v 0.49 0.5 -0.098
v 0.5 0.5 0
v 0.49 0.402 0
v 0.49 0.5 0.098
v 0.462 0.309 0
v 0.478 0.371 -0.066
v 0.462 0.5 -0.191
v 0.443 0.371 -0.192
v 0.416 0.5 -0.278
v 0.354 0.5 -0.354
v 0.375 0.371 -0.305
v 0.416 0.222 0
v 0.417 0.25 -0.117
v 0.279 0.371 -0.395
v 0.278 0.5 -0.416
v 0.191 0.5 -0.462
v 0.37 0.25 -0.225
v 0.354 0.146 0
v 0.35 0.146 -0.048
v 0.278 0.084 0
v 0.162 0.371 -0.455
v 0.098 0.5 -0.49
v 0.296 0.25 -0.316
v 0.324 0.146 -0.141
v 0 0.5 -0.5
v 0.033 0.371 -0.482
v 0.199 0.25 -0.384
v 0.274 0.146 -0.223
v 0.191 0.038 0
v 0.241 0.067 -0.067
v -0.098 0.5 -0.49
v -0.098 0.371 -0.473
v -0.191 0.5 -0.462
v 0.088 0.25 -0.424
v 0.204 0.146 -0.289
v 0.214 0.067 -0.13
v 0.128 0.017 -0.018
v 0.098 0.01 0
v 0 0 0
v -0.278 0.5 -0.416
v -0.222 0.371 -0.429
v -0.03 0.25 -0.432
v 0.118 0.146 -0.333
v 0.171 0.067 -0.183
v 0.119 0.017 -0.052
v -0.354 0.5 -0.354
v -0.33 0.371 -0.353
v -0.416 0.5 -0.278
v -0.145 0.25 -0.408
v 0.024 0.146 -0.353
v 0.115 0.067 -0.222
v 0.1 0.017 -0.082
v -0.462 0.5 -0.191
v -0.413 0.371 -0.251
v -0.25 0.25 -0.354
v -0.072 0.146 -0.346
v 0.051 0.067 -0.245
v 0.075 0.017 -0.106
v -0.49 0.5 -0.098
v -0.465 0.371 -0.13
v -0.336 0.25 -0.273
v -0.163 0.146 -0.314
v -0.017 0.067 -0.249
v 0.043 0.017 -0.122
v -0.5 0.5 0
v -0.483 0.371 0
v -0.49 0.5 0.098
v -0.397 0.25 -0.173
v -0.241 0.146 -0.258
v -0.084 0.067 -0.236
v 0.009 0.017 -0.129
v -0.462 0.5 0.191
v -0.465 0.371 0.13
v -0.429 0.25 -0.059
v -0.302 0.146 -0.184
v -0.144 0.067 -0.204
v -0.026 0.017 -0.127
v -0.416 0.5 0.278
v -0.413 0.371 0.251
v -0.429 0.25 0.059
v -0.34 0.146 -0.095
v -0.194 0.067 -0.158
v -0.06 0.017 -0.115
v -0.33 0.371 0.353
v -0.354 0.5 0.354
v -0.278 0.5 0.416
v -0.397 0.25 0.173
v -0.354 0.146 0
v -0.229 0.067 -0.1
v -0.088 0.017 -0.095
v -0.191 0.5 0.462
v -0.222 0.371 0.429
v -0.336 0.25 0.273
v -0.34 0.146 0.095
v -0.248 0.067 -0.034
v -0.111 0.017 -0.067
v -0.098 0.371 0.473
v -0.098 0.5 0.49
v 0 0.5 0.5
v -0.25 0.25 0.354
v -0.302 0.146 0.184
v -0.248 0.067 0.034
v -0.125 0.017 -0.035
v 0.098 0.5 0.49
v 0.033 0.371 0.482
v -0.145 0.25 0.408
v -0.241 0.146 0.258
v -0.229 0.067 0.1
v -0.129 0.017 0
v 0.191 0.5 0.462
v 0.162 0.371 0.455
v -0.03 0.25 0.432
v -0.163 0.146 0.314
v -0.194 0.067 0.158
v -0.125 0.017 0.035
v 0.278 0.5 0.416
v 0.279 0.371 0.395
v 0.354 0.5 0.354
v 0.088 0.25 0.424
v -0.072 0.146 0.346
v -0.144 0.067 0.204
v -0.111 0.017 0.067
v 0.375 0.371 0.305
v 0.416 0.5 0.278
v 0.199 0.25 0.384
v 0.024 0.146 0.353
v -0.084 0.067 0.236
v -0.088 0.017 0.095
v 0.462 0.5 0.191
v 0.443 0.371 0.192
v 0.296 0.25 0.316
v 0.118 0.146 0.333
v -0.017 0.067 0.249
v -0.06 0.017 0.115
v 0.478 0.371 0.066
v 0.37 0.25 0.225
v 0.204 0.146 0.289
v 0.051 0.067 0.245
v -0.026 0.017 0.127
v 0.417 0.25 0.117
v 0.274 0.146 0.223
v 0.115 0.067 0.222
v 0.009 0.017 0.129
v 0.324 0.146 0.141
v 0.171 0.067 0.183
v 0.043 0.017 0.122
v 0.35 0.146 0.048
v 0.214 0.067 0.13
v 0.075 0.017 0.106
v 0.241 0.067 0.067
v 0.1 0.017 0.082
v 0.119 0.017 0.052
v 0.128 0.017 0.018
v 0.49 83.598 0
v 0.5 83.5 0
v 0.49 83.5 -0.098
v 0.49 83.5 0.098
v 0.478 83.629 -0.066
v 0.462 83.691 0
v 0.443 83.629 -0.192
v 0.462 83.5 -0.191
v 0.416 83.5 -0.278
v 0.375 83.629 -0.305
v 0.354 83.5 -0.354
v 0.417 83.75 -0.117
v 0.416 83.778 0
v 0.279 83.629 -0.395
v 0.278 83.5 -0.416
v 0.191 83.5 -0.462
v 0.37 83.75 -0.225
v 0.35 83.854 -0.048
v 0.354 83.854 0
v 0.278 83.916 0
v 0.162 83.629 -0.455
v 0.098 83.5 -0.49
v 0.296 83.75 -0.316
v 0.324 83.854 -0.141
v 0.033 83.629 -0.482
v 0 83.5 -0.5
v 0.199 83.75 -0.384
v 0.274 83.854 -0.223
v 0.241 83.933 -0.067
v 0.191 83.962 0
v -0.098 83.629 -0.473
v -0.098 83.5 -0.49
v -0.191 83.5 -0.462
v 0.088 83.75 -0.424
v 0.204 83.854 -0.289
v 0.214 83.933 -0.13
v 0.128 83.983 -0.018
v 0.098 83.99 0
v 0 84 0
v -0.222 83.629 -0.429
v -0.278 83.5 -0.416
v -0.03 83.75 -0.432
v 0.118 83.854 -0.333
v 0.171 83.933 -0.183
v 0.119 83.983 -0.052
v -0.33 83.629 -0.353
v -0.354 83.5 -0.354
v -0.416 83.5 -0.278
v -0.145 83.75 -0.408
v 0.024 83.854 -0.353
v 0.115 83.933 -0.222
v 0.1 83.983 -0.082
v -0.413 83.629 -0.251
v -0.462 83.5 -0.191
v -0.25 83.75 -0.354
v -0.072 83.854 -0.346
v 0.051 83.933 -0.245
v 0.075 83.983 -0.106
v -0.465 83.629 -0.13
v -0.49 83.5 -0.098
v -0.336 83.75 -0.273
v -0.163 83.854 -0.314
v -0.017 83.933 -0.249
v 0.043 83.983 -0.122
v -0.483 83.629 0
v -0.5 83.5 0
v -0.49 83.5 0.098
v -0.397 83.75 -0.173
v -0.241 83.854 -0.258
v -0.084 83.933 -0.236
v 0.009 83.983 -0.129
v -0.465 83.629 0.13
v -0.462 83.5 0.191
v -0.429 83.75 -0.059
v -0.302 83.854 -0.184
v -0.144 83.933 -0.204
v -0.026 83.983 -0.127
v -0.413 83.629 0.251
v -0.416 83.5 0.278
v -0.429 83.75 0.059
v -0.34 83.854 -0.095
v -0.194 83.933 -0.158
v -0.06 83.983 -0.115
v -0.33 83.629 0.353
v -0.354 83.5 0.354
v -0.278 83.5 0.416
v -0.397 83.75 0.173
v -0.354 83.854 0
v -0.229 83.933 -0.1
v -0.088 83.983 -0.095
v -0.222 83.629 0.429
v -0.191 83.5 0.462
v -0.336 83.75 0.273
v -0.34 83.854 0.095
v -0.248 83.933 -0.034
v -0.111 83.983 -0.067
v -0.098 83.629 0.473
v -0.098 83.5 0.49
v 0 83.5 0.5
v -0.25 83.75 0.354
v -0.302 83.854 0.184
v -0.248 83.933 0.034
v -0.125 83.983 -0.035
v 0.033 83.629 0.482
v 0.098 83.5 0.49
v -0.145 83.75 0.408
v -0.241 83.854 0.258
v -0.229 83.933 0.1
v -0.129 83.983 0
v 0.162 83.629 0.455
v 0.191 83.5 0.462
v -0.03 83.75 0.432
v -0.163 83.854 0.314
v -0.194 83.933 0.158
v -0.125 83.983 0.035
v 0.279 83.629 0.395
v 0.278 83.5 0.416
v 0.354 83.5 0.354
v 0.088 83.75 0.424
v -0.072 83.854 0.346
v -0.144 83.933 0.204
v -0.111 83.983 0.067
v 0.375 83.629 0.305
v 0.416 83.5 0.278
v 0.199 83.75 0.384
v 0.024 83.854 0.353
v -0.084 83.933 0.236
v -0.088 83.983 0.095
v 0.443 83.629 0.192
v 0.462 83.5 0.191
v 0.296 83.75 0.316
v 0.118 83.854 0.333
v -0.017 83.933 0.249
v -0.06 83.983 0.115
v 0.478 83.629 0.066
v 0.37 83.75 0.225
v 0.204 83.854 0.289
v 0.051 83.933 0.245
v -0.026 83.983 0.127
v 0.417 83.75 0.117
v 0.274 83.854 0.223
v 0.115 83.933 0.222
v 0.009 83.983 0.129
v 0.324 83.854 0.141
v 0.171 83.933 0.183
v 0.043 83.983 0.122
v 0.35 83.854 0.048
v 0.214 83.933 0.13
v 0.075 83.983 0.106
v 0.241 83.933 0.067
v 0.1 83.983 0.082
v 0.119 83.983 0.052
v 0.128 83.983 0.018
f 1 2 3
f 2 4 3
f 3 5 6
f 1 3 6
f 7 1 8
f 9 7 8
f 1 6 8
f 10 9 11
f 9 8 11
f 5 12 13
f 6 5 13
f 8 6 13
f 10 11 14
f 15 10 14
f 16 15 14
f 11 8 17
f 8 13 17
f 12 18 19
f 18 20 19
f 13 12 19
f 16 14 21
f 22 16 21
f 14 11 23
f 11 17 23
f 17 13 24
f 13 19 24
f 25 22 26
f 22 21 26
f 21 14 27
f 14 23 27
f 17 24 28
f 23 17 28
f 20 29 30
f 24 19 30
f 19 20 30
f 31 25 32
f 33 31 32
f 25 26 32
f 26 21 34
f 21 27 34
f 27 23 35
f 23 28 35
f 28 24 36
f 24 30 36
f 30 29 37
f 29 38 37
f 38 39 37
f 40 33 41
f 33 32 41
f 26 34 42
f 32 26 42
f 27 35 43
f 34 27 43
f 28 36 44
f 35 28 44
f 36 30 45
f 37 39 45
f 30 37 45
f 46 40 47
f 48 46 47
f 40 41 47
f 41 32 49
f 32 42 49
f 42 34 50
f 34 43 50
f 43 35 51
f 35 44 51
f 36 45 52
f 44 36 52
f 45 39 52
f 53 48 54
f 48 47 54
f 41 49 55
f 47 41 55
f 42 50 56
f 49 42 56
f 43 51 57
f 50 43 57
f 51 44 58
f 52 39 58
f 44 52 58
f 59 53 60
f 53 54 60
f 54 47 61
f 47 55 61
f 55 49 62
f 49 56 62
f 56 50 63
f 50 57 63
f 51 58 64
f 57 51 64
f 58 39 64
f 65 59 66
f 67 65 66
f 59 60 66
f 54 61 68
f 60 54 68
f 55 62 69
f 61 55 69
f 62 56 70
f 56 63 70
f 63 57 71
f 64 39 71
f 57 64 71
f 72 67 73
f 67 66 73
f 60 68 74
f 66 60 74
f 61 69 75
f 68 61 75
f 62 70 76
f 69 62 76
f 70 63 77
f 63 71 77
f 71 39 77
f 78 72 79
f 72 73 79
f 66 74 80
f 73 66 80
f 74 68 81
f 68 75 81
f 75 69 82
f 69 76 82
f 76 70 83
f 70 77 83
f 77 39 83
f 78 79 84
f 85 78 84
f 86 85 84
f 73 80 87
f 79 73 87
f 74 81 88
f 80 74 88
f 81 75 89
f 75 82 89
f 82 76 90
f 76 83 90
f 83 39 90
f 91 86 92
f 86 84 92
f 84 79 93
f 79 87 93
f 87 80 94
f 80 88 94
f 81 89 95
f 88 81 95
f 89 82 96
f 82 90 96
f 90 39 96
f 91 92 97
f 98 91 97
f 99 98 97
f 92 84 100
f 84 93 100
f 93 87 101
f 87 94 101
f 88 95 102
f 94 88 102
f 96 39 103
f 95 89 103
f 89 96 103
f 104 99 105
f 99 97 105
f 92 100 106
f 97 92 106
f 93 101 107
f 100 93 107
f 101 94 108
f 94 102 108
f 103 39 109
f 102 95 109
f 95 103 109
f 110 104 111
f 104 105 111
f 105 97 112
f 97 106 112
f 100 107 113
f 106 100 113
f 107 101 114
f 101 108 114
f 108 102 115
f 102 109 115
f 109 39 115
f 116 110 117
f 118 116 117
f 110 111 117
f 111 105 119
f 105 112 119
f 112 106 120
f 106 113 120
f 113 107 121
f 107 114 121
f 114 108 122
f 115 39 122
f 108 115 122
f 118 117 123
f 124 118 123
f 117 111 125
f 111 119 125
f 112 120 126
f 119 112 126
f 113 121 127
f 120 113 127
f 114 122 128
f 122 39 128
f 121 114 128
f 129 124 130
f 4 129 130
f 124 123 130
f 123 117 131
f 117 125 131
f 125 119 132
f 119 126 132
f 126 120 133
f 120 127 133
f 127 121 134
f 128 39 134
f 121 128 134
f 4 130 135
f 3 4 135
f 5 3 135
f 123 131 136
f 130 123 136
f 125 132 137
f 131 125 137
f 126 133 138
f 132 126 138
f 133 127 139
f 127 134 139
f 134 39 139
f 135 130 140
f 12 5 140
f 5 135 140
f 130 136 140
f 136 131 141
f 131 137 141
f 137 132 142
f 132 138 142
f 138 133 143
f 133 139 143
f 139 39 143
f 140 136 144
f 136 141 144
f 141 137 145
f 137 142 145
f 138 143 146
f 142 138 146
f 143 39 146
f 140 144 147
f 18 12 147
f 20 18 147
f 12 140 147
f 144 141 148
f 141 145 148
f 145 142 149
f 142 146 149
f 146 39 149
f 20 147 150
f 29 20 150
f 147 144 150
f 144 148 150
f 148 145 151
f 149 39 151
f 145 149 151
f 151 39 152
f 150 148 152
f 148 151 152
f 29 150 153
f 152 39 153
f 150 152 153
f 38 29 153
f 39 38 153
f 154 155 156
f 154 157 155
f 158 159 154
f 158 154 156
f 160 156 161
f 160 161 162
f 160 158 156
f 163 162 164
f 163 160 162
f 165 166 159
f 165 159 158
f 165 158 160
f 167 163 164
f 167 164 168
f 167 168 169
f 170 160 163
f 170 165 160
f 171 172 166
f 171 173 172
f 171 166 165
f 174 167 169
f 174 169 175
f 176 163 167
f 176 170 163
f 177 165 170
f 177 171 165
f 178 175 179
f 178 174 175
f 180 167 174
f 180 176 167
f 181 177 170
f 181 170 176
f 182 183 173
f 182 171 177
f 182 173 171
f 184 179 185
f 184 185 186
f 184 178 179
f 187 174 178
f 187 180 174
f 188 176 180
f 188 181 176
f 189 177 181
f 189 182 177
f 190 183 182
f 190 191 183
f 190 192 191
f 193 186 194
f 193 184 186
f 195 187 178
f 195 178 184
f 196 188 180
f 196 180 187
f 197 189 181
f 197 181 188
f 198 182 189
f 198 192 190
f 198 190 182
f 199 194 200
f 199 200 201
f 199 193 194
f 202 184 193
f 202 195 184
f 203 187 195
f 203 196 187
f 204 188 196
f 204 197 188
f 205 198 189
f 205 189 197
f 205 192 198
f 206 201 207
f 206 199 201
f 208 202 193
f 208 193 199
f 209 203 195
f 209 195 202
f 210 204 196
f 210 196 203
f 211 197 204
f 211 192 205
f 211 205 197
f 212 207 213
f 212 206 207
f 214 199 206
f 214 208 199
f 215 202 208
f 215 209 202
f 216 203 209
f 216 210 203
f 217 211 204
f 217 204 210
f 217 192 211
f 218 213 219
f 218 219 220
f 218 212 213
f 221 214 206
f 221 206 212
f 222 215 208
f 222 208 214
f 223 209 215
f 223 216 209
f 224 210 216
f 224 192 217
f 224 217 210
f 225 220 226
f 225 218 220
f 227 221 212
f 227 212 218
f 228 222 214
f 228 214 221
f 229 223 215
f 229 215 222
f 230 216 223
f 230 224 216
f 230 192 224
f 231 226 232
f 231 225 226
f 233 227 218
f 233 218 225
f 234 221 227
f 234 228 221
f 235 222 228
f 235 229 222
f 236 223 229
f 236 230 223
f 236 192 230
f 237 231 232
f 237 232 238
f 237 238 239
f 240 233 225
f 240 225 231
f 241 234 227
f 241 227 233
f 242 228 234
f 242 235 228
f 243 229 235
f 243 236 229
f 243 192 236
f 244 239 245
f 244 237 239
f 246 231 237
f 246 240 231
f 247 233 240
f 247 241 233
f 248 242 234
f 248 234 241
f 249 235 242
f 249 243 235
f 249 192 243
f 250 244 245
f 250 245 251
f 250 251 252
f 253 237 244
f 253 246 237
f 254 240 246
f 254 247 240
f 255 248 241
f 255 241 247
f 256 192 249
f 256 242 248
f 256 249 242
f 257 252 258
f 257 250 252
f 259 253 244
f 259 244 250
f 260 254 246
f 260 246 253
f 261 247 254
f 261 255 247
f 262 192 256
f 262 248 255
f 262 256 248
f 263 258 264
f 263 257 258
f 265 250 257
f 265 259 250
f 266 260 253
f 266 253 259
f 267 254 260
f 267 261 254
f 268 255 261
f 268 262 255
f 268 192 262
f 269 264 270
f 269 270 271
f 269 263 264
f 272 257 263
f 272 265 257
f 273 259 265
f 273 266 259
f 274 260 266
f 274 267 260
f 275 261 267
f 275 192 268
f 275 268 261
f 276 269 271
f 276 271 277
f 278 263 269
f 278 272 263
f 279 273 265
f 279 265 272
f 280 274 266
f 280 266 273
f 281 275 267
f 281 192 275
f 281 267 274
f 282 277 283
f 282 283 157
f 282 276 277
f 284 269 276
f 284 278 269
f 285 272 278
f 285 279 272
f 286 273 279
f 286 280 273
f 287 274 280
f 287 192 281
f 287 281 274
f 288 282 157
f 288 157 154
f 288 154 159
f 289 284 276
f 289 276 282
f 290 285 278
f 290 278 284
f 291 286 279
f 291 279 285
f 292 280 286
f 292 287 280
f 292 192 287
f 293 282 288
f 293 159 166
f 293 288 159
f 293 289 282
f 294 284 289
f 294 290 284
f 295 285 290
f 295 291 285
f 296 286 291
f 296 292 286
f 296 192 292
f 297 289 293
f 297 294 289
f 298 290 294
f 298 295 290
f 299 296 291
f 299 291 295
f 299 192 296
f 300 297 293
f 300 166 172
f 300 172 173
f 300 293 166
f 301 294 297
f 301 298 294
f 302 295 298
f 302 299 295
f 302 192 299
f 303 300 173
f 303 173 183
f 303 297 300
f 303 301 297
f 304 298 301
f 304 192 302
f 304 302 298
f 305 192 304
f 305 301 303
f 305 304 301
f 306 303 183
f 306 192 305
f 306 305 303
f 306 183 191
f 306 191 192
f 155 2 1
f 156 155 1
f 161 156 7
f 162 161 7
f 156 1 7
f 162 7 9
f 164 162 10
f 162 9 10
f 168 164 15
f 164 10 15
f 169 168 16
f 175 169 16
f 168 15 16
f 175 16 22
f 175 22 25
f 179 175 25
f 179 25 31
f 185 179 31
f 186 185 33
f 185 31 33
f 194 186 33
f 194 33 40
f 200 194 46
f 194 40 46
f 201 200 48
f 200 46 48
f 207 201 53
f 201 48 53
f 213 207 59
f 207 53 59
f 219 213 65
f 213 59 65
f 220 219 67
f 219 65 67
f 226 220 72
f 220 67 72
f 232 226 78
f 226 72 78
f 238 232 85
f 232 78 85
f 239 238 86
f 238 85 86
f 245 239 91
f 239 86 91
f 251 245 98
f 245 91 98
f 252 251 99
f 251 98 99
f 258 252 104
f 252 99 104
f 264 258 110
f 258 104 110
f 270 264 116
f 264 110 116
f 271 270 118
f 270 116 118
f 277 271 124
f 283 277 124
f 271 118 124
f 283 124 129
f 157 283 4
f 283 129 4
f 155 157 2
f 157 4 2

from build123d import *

# Parameters (mm, degrees)
IZIM2_R                     = 0.5
Y_KSEKLIK_EKSTR_ZYON1_DEPTH = 84
RADYUS1_R                   = 0.5
RADYUS4_R                   = 0.5


with BuildPart() as part:
    # Çizim2 → Yükseklik-Ekstrüzyon1 (new body)
    with BuildSketch(Plane(origin=(0, 0, 0), x_dir=(1, 0, 0), z_dir=(0, 1, 0))):
        Circle(IZIM2_R)
    extrude(amount=Y_KSEKLIK_EKSTR_ZYON1_DEPTH)

    # Radyus1
    radyus1_edges = [part.edges().sort_by_distance(p)[0] for p in [
        (-0.5, 84, 0),
    ]]
    fillet(radyus1_edges, radius=RADYUS1_R)

    # Radyus4
    radyus4_edges = [part.edges().sort_by_distance(p)[0] for p in [
        (-0.5, 0, 0),
    ]]
    fillet(radyus4_edges, radius=RADYUS4_R)


solid = part.part
